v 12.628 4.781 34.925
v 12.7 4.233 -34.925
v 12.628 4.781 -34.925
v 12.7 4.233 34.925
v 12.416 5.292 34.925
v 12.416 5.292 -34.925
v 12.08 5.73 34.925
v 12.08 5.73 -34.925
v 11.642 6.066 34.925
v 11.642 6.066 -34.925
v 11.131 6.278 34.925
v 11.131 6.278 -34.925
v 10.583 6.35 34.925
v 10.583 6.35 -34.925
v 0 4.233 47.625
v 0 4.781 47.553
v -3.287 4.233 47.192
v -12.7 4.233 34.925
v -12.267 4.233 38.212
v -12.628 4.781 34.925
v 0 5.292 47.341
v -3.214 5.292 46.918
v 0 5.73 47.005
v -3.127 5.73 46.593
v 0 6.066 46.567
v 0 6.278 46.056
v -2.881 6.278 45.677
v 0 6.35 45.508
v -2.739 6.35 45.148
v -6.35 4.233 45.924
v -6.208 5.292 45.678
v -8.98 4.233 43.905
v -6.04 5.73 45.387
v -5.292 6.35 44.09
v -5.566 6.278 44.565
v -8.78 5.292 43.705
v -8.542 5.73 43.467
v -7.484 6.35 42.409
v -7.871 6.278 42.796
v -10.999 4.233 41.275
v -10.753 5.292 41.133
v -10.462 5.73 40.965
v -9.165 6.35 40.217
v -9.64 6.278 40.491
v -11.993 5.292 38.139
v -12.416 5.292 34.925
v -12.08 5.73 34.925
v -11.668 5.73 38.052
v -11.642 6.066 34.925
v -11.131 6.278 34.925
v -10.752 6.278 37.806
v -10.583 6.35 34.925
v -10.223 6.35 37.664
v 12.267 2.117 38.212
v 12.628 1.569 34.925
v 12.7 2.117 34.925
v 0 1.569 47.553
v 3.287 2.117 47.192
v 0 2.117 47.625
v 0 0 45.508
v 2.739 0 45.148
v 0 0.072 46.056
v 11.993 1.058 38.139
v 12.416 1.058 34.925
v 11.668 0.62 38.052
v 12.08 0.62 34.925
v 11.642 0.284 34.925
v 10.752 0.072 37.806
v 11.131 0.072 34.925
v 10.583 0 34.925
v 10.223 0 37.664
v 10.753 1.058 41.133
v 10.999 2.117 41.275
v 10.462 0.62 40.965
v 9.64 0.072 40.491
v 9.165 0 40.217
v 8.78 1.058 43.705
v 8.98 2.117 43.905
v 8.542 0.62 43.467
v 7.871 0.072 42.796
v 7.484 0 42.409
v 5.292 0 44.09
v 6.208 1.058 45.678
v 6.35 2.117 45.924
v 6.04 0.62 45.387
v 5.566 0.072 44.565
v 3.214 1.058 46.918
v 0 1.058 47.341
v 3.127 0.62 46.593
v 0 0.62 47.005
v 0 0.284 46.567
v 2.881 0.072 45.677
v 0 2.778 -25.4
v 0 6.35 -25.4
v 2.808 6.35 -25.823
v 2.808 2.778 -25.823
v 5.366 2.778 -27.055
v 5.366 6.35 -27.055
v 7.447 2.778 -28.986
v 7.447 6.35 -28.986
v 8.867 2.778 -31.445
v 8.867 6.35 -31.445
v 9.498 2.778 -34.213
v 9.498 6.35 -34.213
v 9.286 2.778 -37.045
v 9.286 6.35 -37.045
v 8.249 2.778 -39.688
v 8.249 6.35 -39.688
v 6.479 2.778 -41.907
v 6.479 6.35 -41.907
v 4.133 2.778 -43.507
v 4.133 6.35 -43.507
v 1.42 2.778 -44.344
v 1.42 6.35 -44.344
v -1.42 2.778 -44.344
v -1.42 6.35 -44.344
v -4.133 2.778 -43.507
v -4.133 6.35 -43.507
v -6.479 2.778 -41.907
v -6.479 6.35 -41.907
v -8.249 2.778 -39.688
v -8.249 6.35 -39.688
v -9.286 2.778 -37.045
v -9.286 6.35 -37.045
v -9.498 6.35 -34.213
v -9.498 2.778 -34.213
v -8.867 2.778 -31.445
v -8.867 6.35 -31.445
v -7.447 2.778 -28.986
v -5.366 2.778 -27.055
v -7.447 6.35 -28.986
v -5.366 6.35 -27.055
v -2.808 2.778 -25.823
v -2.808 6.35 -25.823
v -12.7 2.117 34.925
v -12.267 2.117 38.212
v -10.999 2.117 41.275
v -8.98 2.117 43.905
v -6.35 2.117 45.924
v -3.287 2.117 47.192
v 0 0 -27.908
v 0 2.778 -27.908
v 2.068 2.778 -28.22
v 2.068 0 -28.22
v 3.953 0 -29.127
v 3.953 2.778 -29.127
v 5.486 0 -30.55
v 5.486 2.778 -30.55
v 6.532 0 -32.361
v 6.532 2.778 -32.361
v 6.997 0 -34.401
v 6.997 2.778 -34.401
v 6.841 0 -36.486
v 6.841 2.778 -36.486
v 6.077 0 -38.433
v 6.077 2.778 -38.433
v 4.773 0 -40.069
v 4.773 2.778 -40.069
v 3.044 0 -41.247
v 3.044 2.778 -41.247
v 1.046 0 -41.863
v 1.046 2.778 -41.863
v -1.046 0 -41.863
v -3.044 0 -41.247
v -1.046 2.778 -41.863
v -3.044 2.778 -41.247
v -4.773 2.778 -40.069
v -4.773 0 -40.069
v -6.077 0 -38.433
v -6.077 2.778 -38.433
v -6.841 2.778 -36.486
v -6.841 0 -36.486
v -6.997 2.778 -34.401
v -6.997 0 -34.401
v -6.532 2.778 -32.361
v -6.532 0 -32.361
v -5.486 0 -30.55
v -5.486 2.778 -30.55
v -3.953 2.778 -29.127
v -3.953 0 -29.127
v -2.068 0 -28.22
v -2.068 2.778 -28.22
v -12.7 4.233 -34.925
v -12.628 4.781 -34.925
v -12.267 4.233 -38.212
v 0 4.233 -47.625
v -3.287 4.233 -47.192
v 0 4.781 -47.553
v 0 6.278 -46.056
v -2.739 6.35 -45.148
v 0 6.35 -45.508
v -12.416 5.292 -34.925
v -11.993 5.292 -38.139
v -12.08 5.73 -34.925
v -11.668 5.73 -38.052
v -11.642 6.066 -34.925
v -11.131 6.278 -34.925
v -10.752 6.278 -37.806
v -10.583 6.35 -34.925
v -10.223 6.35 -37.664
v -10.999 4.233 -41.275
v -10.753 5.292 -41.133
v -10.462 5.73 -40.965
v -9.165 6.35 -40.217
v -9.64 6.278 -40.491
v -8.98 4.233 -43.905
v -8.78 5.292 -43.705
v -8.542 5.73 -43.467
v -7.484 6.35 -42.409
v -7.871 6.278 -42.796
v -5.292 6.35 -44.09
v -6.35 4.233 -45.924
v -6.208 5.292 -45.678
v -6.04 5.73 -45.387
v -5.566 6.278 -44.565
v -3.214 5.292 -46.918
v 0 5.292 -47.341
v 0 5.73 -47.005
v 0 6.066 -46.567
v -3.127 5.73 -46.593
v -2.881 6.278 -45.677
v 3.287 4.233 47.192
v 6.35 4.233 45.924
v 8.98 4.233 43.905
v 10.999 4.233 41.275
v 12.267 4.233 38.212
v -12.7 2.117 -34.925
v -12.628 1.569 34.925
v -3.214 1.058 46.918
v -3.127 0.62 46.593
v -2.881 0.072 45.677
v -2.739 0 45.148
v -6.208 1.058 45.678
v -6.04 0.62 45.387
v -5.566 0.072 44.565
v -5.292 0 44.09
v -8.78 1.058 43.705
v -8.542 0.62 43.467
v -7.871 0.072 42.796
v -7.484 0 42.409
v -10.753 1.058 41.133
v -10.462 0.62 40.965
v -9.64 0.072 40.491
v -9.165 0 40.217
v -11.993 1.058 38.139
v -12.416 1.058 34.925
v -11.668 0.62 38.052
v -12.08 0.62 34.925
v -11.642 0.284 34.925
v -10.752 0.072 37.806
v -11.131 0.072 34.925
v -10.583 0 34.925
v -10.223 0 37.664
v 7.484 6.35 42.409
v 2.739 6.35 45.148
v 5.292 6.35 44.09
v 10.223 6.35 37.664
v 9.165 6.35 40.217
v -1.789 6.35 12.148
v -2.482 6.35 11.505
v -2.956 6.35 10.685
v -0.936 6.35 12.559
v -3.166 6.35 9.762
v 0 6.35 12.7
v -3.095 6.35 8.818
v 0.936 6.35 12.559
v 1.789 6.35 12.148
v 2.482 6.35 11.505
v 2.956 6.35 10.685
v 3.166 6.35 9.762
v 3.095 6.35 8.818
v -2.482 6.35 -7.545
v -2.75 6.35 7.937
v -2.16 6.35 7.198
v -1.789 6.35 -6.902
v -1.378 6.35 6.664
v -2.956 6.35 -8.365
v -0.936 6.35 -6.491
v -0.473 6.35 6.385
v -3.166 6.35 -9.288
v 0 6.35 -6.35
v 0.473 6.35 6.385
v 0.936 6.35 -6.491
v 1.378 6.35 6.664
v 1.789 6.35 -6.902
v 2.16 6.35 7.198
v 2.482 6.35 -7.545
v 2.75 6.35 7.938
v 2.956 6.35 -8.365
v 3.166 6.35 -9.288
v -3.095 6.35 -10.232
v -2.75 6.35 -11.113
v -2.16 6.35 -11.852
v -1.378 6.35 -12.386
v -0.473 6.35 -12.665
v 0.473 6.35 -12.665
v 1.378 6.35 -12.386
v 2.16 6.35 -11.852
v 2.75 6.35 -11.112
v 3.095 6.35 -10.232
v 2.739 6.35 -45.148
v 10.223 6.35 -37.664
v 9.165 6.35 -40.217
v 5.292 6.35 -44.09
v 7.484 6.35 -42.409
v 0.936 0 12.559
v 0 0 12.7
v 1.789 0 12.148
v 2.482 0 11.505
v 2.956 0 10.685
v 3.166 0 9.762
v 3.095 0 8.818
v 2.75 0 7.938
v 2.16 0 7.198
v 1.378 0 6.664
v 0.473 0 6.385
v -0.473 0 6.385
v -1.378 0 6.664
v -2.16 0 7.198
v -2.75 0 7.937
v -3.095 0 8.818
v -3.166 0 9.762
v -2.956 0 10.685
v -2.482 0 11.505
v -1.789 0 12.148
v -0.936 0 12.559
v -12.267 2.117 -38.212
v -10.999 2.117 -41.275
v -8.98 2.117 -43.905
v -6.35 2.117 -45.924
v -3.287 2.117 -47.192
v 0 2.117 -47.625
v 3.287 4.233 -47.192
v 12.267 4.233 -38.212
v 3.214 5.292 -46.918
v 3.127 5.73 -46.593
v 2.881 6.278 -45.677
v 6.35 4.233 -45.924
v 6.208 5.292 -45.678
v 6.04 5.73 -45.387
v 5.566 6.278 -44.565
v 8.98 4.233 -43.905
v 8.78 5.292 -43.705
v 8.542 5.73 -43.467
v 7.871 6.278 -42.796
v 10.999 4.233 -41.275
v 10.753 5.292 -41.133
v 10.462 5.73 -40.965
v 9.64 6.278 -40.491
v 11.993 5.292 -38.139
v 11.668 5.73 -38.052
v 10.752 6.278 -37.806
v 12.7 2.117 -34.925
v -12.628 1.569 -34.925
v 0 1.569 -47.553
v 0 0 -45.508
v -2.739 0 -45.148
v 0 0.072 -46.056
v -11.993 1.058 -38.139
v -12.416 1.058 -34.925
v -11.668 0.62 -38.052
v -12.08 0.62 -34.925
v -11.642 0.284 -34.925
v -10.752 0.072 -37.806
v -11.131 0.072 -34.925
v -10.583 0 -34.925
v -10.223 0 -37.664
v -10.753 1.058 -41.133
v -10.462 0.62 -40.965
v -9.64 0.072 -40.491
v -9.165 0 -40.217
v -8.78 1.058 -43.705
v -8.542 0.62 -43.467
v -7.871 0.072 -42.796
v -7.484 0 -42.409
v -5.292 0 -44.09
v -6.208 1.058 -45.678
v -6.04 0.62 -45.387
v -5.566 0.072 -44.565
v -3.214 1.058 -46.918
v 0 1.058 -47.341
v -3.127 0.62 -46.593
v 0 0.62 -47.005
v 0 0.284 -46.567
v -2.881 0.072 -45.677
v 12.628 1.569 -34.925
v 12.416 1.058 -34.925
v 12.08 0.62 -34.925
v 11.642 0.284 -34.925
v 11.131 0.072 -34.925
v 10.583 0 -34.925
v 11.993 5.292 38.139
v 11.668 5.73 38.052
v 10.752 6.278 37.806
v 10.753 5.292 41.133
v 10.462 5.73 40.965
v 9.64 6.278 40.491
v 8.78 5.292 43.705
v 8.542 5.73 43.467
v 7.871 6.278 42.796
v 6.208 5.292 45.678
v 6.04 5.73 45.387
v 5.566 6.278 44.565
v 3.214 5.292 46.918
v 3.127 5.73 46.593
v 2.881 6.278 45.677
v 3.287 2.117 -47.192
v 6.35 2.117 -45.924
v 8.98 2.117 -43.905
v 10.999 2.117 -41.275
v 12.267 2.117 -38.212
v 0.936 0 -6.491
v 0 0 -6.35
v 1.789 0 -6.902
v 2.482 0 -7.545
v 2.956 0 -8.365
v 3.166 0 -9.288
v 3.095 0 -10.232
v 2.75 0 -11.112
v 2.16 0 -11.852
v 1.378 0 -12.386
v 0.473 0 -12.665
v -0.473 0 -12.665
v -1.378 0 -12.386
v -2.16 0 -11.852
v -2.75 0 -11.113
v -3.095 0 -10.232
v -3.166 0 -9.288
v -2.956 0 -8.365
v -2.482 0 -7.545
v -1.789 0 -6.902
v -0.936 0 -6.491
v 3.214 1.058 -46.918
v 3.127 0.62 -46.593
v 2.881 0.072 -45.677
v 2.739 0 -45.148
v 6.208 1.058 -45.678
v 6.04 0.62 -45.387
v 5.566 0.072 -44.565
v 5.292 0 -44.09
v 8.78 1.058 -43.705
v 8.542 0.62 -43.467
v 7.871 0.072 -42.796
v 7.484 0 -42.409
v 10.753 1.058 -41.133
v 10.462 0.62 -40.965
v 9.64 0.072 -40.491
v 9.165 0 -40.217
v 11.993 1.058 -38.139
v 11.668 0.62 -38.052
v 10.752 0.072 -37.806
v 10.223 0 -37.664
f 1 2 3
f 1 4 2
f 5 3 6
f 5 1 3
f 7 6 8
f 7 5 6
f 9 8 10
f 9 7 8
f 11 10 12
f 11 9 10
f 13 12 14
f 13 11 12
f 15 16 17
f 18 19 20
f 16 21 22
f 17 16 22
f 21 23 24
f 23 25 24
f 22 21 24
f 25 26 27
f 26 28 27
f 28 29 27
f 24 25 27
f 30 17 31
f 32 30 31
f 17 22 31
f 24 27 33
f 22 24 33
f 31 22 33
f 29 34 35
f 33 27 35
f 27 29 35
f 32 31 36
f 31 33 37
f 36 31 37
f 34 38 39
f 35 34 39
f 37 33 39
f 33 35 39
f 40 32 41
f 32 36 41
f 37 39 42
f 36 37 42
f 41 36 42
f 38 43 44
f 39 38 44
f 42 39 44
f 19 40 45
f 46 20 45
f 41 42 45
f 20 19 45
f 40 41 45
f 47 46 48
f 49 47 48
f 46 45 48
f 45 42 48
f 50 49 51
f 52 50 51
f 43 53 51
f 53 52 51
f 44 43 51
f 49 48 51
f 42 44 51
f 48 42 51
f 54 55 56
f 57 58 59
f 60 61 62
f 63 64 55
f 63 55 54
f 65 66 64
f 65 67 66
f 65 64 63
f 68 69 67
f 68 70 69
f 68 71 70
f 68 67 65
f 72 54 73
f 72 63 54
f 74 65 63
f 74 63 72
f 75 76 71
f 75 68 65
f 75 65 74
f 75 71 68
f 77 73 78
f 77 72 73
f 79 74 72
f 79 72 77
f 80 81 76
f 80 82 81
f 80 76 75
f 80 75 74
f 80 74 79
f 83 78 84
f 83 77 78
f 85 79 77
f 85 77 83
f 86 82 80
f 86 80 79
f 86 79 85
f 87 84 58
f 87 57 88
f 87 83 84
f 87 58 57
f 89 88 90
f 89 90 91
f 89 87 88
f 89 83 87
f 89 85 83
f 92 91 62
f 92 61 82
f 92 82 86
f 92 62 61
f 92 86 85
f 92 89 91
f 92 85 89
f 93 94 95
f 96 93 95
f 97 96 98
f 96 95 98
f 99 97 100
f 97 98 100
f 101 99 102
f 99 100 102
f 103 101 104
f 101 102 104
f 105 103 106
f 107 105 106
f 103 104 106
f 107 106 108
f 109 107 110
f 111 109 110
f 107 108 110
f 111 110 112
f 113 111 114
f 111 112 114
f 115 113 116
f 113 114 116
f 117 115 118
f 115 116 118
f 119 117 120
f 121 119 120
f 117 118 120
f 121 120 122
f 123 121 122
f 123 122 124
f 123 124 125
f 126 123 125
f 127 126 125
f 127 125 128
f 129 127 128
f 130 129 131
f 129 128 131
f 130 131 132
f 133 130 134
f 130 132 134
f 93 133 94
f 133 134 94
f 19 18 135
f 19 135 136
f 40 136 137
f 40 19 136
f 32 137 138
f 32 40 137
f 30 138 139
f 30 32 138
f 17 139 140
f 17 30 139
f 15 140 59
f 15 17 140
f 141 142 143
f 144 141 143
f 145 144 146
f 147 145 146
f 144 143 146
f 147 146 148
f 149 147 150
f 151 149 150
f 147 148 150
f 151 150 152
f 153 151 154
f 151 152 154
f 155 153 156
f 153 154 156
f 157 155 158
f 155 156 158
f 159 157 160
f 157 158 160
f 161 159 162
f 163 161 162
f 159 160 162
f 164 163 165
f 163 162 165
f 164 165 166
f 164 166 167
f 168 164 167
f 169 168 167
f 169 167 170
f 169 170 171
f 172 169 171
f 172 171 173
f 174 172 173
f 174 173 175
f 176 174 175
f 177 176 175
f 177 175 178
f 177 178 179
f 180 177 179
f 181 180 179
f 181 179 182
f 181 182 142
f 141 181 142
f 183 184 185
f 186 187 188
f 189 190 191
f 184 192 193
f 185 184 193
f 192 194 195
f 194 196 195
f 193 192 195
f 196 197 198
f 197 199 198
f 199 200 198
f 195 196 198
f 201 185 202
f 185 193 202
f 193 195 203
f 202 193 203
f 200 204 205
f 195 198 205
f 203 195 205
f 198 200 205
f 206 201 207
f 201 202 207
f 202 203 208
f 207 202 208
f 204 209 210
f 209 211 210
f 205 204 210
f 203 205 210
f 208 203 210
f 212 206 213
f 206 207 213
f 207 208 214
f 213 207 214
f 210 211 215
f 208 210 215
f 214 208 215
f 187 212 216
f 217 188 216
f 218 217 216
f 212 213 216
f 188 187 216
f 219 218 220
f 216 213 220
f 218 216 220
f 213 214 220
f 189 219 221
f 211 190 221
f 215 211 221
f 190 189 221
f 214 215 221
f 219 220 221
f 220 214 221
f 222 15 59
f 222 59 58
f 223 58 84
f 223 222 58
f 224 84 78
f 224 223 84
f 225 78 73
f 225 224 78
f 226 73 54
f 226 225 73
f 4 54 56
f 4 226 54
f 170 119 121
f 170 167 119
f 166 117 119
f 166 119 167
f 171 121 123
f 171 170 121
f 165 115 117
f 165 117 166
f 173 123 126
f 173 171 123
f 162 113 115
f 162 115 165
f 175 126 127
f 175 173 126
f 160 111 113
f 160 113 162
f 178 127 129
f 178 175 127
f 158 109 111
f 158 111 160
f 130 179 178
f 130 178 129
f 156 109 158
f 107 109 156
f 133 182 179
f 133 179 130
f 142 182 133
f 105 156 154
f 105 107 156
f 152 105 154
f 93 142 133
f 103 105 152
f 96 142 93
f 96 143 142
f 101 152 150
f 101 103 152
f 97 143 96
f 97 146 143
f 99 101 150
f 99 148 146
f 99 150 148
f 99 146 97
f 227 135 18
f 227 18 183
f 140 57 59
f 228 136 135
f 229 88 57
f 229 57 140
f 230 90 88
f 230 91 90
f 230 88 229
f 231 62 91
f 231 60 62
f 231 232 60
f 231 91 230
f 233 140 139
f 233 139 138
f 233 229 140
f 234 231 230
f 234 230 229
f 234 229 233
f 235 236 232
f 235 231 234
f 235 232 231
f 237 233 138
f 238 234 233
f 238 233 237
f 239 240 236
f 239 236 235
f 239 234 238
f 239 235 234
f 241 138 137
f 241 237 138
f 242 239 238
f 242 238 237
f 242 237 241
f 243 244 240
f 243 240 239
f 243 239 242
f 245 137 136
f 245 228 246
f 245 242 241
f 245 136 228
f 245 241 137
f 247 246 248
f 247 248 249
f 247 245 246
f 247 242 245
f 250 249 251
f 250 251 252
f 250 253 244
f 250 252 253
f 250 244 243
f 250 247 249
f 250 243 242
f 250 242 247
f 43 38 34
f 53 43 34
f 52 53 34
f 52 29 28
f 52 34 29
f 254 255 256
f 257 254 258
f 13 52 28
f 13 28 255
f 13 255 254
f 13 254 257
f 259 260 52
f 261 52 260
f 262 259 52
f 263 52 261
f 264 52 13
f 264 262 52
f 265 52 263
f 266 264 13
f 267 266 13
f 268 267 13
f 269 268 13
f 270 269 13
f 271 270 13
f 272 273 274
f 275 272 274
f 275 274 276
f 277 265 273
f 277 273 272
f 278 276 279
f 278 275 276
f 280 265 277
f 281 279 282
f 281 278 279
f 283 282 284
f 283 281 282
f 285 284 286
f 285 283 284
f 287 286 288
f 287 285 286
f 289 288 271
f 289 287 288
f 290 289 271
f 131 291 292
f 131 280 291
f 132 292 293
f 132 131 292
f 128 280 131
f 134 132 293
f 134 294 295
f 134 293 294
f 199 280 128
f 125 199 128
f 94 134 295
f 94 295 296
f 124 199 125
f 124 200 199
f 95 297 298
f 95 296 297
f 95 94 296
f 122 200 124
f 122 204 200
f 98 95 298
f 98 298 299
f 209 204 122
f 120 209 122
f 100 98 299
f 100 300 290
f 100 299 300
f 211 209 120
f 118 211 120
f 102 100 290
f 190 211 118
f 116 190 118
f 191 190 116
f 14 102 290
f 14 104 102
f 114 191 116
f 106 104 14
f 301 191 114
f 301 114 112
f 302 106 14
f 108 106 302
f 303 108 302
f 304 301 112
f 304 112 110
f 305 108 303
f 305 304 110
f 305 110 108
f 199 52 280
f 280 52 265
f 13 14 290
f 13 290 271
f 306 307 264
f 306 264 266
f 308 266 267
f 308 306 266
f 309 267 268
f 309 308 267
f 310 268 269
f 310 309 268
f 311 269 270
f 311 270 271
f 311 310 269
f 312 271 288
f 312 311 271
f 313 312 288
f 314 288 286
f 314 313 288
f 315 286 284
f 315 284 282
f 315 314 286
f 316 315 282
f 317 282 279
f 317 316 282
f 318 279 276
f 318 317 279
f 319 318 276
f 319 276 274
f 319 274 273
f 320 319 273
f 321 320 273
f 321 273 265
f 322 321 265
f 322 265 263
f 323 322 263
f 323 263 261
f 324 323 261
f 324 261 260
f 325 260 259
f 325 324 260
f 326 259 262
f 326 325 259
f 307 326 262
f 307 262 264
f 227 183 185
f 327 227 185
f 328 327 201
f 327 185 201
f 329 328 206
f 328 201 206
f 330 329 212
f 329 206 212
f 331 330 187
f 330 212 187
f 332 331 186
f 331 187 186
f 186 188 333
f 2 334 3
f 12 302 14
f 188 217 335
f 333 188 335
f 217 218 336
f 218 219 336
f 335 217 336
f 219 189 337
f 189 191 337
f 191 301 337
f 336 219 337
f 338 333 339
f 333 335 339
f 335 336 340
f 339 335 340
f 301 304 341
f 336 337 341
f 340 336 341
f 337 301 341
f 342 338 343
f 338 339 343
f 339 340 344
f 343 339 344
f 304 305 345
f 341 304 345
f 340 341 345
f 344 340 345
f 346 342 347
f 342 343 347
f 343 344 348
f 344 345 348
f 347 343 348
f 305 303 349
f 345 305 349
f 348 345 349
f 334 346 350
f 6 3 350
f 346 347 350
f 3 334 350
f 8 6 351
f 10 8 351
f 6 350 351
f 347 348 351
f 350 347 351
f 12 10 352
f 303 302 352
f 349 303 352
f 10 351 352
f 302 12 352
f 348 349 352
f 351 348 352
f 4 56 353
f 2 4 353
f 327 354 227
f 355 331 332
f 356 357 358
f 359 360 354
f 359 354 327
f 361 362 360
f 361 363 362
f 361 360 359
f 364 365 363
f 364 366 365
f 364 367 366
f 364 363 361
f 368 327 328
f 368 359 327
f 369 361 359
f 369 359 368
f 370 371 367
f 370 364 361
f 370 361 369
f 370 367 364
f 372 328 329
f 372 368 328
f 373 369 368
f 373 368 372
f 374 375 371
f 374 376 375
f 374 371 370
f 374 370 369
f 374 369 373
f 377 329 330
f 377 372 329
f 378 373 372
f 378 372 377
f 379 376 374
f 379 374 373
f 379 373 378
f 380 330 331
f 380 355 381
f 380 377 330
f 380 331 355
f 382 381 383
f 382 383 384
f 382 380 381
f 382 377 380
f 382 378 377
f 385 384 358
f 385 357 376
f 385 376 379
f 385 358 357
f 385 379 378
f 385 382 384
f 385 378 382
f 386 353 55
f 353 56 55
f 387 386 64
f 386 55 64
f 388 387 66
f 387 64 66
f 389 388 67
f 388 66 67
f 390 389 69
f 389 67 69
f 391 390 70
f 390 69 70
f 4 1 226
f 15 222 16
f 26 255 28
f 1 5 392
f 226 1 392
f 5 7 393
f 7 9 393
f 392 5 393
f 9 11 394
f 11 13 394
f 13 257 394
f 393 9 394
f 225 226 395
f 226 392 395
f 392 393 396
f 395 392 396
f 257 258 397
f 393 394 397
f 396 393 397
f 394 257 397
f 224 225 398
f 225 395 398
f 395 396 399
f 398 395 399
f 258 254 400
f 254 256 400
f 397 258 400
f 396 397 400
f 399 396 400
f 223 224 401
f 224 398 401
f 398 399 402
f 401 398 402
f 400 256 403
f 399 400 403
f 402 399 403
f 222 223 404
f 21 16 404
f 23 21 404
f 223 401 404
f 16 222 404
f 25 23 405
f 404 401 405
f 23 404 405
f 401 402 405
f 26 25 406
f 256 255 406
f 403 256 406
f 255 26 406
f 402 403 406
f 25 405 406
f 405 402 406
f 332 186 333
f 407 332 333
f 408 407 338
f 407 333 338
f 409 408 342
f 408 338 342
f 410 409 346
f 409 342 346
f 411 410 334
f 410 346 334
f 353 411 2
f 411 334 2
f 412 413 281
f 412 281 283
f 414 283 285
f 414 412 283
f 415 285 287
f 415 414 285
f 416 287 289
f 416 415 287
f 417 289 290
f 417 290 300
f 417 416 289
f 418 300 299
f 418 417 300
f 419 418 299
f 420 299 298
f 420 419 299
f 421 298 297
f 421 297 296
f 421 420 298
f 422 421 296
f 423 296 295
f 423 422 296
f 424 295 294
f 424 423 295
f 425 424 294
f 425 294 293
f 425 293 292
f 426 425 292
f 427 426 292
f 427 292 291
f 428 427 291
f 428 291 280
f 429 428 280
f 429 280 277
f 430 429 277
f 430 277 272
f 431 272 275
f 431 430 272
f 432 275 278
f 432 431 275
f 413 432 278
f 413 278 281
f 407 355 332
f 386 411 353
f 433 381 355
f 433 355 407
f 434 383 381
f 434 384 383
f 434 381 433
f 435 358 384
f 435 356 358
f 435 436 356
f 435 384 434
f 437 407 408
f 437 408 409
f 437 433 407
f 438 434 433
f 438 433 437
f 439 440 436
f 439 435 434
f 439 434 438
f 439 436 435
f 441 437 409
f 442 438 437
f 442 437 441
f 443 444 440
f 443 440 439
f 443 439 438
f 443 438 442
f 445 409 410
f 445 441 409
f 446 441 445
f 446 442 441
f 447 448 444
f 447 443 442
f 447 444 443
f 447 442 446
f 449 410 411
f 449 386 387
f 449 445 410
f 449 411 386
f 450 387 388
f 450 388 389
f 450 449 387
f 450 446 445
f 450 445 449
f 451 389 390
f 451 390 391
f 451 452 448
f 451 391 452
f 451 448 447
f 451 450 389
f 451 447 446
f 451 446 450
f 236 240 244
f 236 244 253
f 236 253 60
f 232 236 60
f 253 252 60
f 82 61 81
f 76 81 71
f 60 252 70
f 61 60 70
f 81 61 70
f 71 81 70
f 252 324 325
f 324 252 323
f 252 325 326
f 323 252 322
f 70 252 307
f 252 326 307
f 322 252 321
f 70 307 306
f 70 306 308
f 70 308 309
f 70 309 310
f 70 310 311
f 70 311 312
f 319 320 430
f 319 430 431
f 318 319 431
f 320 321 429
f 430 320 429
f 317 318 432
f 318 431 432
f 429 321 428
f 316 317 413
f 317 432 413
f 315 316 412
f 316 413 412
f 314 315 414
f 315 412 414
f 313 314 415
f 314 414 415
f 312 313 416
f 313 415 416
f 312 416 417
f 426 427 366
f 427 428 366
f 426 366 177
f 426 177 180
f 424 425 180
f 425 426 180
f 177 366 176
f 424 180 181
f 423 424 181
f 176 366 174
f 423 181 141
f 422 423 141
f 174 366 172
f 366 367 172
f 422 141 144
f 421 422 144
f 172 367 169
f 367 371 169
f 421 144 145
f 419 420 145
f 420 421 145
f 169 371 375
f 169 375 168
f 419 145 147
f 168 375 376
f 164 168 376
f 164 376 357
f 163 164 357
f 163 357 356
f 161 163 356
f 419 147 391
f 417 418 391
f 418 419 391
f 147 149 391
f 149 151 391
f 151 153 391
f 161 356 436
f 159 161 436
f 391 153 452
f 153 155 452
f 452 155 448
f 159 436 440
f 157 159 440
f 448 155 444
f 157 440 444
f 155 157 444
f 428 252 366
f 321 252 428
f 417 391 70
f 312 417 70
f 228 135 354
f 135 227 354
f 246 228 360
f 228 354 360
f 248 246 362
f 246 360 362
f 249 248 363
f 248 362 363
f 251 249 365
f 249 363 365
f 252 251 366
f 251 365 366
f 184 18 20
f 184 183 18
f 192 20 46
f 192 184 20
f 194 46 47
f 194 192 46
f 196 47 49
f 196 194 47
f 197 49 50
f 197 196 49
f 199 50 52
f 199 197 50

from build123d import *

# Parameters (mm, degrees)
SKETCH1_W           = 25.4
SKETCH1_H           = 95.25
SKETCH1_R           = 3.175
BOSS_EXTRUDE1_DEPTH = 6.35
FILLET1_R           = 12.7
FILLET2_R           = 2.116666667
SKETCH5_R           = 9.525
SKETCH5_R_2         = 7.016807895
CUT_EXTRUDE2_DEPTH  = 3.571875
SKETCH5_2_R         = 7.016807895
CUT_EXTRUDE3_DEPTH  = 6.35


with BuildPart() as part:
    # Sketch1 → Boss-Extrude1 (new body)
    with BuildSketch(Plane(origin=(0, 0, 0), x_dir=(1, 0, 0), z_dir=(0, 1, 0))):
        Rectangle(SKETCH1_W, SKETCH1_H)
        with Locations(Location((0, 9.525, 0), (0, 0, 270))):
            Circle(SKETCH1_R, mode=Mode.SUBTRACT)
        with Locations(Location((0, -9.525, 0), (0, 0, 270))):
            Circle(SKETCH1_R, mode=Mode.SUBTRACT)
    extrude(amount=BOSS_EXTRUDE1_DEPTH)

    # Fillet1
    fillet1_edges = [part.edges().sort_by_distance(p)[0] for p in [
        (-12.7, 3.175, -47.625),
        (12.7, 3.175, -47.625),
        (-12.7, 3.175, 47.625),
        (12.7, 3.175, 47.625),
    ]]
    fillet(fillet1_edges, radius=FILLET1_R - 0.0001)  # a hair under: the kernel refuses the full size

    # Fillet2
    fillet2_edges = [part.edges().sort_by_distance(p)[0] for p in [
        (-12.7, 0, 0),
        (-12.7, 6.35, 0),
        (12.7, 0, 0),
        (8.98028541, 0, 43.90528541),
        (-8.98028541, 0, 43.90528541),
        (8.98028541, 0, -43.90528541),
        (-8.98028541, 0, -43.90528541),
        (12.7, 6.35, 0),
        (8.98028541, 6.35, 43.90528541),
        (-8.98028541, 6.35, 43.90528541),
        (8.98028541, 6.35, -43.90528541),
        (-8.98028541, 6.35, -43.90528541),
    ]]
    fillet(fillet2_edges, radius=FILLET2_R)

    # Sketch5 → Cut-Extrude2 (cut)
    with BuildSketch(Plane(origin=(0, 6.35, 0), x_dir=(1, 0, 0), z_dir=(0, 1, 0))):
        with Locations(Location((0, 34.925, 0), (0, 0, 270))):
            Circle(SKETCH5_R)
        with Locations(Location((0, 34.925, 0), (0, 0, 270))):
            Circle(SKETCH5_R_2, mode=Mode.SUBTRACT)
    extrude(amount=-CUT_EXTRUDE2_DEPTH, mode=Mode.SUBTRACT)

    # Sketch5<2> → Cut-Extrude3 (cut)
    with BuildSketch(Plane(origin=(0, 6.35, 0), x_dir=(1, 0, 0), z_dir=(0, 1, 0))):
        with Locations(Location((0, 34.925, 0), (0, 0, 270))):
            Circle(SKETCH5_2_R)
    extrude(amount=-CUT_EXTRUDE3_DEPTH, mode=Mode.SUBTRACT)


solid = part.part
